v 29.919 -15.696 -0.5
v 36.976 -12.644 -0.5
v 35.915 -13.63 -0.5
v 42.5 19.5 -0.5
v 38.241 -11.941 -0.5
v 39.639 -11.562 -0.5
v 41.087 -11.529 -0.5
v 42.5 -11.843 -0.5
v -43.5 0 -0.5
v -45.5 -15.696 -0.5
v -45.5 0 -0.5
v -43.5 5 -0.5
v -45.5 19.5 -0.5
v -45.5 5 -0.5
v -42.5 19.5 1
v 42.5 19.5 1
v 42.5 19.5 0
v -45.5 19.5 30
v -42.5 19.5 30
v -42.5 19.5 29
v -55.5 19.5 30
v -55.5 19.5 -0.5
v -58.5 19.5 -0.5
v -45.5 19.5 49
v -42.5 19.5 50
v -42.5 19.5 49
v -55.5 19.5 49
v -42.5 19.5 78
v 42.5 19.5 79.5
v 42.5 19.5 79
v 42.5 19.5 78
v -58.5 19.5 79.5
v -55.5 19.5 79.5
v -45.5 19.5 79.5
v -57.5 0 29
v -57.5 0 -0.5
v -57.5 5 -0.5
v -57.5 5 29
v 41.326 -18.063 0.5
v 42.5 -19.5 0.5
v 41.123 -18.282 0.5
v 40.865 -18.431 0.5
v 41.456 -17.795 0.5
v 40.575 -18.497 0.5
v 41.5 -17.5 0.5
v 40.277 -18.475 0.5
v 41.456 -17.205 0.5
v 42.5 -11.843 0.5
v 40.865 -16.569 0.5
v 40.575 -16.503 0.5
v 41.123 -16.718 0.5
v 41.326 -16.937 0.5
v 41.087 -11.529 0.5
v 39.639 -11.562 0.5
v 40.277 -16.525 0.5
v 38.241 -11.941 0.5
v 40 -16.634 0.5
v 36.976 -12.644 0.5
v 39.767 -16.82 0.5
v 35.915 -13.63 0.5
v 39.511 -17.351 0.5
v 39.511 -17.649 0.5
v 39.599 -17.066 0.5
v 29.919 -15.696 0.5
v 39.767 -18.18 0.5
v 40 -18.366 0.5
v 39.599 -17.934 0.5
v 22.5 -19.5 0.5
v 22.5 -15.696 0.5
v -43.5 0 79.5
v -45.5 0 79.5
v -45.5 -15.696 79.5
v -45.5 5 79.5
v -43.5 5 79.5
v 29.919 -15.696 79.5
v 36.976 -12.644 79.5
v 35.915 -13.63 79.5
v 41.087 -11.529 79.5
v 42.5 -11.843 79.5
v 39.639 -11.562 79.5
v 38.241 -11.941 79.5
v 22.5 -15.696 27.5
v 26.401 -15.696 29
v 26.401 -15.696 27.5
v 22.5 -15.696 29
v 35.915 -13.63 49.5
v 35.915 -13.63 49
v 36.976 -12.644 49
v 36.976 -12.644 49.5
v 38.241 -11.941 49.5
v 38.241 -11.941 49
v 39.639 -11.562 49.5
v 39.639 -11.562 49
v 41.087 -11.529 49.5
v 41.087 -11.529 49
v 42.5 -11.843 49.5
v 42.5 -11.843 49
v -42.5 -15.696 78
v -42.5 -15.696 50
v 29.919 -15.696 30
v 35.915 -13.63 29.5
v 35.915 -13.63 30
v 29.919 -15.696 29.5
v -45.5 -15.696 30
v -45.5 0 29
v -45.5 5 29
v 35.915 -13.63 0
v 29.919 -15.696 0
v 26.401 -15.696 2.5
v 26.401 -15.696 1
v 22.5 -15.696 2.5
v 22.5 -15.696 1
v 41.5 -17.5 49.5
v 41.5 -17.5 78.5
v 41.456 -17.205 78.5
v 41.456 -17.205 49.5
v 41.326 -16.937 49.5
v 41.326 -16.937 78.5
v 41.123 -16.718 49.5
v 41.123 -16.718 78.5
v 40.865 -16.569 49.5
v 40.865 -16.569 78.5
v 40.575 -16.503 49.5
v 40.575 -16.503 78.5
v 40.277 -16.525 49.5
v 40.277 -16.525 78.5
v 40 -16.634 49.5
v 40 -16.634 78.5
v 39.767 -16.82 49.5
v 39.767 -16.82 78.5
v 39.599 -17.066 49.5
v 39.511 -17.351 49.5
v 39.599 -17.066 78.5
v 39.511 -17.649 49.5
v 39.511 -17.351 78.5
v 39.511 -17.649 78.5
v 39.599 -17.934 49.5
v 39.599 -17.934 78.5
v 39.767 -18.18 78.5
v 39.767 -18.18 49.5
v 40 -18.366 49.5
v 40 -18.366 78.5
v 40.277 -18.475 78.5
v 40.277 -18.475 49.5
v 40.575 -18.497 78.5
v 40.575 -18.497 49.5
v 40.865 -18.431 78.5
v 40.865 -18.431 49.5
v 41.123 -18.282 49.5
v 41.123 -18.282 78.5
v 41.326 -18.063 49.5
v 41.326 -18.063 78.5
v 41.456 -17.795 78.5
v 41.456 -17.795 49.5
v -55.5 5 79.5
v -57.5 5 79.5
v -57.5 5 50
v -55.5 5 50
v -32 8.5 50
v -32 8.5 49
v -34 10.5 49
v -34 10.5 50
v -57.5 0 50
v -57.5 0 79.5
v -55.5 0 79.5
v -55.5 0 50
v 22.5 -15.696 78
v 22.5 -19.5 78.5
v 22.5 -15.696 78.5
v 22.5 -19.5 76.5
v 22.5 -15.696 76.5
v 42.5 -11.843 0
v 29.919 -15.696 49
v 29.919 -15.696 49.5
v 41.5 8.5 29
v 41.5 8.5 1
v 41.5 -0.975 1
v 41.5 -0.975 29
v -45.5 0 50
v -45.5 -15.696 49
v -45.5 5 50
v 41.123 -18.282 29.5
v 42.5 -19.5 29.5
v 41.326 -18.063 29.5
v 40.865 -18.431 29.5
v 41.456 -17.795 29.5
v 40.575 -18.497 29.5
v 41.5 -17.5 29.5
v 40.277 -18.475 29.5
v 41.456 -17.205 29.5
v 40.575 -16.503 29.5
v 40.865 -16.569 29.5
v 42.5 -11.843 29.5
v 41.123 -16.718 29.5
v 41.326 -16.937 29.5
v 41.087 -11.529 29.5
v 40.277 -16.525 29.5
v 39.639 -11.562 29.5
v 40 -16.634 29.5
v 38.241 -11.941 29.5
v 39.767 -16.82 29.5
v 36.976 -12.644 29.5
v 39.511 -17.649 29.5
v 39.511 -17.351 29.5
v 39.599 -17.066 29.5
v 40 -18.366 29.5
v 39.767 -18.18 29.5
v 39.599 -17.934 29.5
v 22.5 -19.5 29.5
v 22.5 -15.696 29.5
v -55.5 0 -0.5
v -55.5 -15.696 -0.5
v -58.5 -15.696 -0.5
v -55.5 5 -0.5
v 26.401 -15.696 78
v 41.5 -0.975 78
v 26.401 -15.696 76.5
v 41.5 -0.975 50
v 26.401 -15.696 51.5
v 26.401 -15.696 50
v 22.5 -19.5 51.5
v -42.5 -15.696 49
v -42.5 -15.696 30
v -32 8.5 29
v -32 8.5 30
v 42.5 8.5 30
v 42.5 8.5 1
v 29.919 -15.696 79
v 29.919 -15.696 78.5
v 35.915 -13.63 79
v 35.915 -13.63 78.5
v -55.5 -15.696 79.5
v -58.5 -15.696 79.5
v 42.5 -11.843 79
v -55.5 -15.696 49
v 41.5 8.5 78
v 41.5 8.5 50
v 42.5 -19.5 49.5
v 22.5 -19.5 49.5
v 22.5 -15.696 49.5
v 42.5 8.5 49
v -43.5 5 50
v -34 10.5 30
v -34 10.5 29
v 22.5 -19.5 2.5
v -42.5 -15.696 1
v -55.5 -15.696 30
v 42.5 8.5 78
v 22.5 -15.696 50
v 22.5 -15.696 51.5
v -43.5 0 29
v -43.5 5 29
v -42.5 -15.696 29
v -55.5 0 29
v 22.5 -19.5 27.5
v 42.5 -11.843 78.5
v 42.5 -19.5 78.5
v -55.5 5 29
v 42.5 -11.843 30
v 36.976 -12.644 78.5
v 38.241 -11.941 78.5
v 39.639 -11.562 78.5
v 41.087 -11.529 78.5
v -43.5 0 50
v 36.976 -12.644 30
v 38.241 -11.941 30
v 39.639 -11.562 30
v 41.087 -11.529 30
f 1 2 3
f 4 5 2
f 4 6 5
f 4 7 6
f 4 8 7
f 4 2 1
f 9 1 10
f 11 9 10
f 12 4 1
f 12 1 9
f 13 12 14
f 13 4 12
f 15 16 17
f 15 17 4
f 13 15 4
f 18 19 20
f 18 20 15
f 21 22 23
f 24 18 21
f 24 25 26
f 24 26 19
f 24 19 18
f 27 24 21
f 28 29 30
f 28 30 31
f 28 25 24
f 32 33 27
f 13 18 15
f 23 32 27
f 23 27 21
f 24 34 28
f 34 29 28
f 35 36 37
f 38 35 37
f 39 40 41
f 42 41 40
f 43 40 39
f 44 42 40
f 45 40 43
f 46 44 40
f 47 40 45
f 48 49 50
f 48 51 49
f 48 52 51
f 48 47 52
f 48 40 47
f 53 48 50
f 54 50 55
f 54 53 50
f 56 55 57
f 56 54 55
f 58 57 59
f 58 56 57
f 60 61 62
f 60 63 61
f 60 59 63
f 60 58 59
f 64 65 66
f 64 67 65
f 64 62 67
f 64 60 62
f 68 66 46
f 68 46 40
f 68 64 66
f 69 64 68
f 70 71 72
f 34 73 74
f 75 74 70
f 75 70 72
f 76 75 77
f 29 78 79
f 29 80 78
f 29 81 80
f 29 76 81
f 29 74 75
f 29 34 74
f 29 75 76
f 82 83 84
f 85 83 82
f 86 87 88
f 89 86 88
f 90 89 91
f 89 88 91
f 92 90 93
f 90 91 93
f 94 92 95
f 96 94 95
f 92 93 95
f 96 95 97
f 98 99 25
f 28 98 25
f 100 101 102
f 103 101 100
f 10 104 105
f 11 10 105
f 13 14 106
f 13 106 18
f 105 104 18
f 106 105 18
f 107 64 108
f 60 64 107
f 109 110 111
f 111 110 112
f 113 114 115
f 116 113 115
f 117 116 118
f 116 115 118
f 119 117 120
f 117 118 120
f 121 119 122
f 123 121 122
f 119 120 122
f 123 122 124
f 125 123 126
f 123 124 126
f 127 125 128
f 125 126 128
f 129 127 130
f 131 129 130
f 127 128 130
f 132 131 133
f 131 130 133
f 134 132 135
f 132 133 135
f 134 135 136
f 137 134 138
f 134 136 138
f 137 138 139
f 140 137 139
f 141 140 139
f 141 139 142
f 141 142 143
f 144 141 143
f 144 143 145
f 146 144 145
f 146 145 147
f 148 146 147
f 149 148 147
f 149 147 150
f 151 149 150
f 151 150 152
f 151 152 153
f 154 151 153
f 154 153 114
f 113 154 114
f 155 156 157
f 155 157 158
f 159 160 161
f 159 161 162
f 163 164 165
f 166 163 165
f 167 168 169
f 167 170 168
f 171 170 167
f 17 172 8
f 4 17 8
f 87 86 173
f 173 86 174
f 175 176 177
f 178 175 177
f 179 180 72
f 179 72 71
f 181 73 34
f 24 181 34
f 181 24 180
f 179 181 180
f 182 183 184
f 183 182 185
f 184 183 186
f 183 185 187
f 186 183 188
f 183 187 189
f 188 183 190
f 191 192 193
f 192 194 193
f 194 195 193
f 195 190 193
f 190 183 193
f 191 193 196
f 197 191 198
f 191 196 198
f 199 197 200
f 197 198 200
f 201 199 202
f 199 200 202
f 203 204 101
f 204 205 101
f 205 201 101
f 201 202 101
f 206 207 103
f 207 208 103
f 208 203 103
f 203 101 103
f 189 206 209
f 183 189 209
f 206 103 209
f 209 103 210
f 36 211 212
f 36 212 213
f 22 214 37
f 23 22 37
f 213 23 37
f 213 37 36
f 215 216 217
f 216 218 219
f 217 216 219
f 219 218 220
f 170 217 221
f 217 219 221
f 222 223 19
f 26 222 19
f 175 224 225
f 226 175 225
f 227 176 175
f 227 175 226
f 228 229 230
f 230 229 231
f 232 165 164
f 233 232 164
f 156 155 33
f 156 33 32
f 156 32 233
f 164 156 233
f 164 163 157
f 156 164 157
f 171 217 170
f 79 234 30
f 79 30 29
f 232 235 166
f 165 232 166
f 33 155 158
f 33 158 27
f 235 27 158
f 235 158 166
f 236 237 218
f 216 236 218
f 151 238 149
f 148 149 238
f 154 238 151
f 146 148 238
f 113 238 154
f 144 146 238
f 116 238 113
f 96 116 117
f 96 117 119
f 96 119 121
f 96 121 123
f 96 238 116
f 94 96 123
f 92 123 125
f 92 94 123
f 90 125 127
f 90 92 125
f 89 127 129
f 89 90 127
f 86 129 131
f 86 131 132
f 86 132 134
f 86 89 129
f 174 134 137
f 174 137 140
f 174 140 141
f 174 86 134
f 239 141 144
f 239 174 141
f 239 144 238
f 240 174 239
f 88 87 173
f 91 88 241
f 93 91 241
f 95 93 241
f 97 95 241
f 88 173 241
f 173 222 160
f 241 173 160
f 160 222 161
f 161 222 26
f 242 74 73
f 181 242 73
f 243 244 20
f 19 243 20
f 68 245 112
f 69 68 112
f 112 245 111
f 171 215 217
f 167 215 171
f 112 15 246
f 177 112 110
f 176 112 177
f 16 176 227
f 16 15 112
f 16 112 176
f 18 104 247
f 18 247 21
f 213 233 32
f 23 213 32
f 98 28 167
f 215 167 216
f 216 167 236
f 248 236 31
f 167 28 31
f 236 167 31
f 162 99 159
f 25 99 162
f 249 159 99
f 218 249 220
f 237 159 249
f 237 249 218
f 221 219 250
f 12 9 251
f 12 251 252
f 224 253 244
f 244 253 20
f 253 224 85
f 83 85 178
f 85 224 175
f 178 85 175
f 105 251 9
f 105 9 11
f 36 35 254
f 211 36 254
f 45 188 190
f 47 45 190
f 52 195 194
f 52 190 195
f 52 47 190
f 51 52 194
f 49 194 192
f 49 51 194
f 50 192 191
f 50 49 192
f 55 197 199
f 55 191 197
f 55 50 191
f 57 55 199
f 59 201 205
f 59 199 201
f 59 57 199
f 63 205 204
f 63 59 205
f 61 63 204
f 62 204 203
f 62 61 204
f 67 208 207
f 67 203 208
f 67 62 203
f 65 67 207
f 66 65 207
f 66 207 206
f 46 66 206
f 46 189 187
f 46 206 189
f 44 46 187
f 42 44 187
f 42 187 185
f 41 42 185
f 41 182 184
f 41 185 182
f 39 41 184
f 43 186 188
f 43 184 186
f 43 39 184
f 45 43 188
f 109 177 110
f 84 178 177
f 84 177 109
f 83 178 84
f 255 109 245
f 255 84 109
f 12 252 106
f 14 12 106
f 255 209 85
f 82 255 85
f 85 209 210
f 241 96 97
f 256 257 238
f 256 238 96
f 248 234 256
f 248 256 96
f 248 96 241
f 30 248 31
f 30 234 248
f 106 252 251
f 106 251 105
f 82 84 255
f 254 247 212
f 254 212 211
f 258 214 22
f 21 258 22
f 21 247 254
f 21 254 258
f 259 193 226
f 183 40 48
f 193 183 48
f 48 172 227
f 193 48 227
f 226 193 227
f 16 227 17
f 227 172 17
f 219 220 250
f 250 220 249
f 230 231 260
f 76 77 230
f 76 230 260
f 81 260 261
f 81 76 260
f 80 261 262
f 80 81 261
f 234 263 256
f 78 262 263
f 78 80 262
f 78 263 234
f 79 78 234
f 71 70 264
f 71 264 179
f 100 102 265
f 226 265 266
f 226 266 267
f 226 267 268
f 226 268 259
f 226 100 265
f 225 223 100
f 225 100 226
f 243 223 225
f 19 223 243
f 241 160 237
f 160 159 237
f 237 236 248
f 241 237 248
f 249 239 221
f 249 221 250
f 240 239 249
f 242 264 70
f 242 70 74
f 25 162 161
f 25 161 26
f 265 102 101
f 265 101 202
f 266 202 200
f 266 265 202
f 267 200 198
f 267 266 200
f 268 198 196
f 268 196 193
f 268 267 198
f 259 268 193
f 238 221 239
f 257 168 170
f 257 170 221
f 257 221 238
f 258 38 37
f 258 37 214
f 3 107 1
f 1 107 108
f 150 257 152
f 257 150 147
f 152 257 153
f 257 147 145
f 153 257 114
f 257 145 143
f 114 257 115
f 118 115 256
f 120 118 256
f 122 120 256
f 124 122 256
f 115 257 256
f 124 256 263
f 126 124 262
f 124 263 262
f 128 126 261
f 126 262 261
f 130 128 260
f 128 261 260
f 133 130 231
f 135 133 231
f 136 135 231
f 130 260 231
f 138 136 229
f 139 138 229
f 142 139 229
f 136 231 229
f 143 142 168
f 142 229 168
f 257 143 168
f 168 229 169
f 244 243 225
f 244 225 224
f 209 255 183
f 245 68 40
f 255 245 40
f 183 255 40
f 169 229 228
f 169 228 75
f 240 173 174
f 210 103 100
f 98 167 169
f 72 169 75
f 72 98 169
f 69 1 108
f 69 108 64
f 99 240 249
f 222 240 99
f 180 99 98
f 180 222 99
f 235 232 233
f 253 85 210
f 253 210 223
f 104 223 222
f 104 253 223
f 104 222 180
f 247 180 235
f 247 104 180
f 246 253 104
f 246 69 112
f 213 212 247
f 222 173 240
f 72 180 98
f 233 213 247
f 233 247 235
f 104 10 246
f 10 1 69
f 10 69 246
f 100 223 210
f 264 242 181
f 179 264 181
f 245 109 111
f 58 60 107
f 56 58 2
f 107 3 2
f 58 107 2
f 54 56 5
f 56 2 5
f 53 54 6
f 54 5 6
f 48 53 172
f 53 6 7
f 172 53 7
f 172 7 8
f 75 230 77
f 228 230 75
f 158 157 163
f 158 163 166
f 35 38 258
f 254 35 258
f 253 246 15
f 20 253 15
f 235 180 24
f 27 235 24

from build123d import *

# Parameters (mm, degrees)
SKETCH4_W                 = 85
SKETCH4_H                 = 39
BOSS_EXTRUDE2_DEPTH       = 30
BOSS_EXTRUDE3_DEPTH       = 39
SKETCH7_W                 = 84
SKETCH7_H                 = 28
CUT_EXTRUDE1_DEPTH        = 39
CUT_EXTRUDE2_DEPTH        = 1
SKETCH9_W                 = 1
SKETCH9_H                 = 9
CUT_EXTRUDE4_DEPTH        = 28
SKETCH19_W                = 31
SKETCH19_H                = 39
BOSS_EXTRUDE4_DEPTH       = 2
SKETCH20_W                = 3
SKETCH20_H                = 39
BOSS_EXTRUDE5_DEPTH       = 9
SKETCH38_W                = 1
SKETCH38_H                = 29
BOSS_EXTRUDE6_DEPTH       = 9
SKETCH39_W                = 1
SKETCH39_H                = 39
BOSS_EXTRUDE7_DEPTH       = 47.410129
BOSS_EXTRUDE8_DEPTH       = 28
SKETCH42_W                = 2
SKETCH42_H                = 5
CUT_EXTRUDE5_DEPTH        = 30
BOSS_EXTRUDE9_DEPTH       = 1
SKETCH44_R                = 1
CUT_EXTRUDE7_DEPTH        = 32
SKETCH46_W                = 85
SKETCH46_H                = 3.803593904
CUT_EXTRUDE8_DEPTH        = 1
CUT_EXTRUDE9_START        = -1
SKETCH48_W                = 65
SKETCH48_H                = 1.901796952
CUT_EXTRUDE9_DEPTH        = 30
SKETCH49_R                = 6
CUT_EXTRUDE10_DEPTH       = 1
CUT_EXTRUDE11_START       = -3
SKETCH50_W                = 31
SKETCH50_H                = 1.901796952
CUT_EXTRUDE11_DEPTH       = 3
SKETCH52_W                = 3
SKETCH52_H                = 39
BOSS_EXTRUDE10_DEPTH      = 0.5
CUT_EXTRUDE13_START       = -85
SKETCH56_W                = 1
SKETCH56_H                = 35.196406096
CUT_EXTRUDE13_DEPTH       = 85
SKETCH58_W                = 88
SKETCH58_H                = 39
CUT_EXTRUDE14_DEPTH       = 0.5
SKETCH59_W                = 88
SKETCH59_H                = 39
CUT_EXTRUDE15_DEPTH       = 0.5
SKETCH60_W                = 19
SKETCH60_H                = 37.098203048
BOSS_EXTRUDE11_DEPTH      = 10
BOSS_EXTRUDE12_DEPTH      = 30.5
BOSS_EXTRUDE12_DEPTH_BACK = 49.5
SKETCH61_W                = 3
SKETCH61_H                = 37.098203048
MIRROR13_COPY_1_SKETCH_W  = 2
MIRROR13_COPY_1_SKETCH_H  = 5
MIRROR13_COPY_1_DEPTH     = 30
MIRROR13_COPY_2_SKETCH_W  = 2
MIRROR13_COPY_2_SKETCH_H  = 5
MIRROR13_COPY_2_DEPTH     = 30
SKETCH63_W                = 85
SKETCH63_H                = 3.803593904
CUT_EXTRUDE16_DEPTH       = 0.5
MIRROR15_COPY_1_SKETCH_W  = 85
MIRROR15_COPY_1_SKETCH_H  = 3.803593904
MIRROR15_COPY_1_DEPTH     = 0.5
SKETCH66_R                = 6
CUT_EXTRUDE17_DEPTH       = 0.5
MIRROR17_COPY_1_SKETCH_R  = 6
MIRROR17_COPY_1_DEPTH     = 0.5
CHAMFER3_START            = 24.587959213
CHAMFER3_OUTLINE_W        = 9
CHAMFER3_OUTLINE_H        = 0.5
CHAMFER3_DEPTH            = 7.695233043
SKETCH67_W                = 3
SKETCH67_H                = 19
CUT_EXTRUDE18_DEPTH       = 1.901797
SKETCH72_W                = 65
SKETCH72_H                = 0.5
CUT_EXTRUDE21_DEPTH       = 1.901797
MIRROR20_COPY_1_SKETCH_W  = 65
MIRROR20_COPY_1_SKETCH_H  = 0.5
MIRROR20_COPY_1_DEPTH     = 1.901797
SKETCH74_W                = 7.418761949
SKETCH74_H                = 3.803593904
BOSS_EXTRUDE13_DEPTH      = 2
MIRROR22_COPY_1_SKETCH_W  = 7.418761949
MIRROR22_COPY_1_SKETCH_H  = 3.803593904
MIRROR22_COPY_1_DEPTH     = 2
CUT_EXTRUDE31_START       = -16
SKETCH79_W                = 80
SKETCH79_H                = 1.901796952
CUT_EXTRUDE31_DEPTH       = 16
SKETCH81_W                = 94
SKETCH81_H                = 1
CUT_EXTRUDE33_DEPTH       = 2
CUT_EXTRUDE34_START       = -11
SKETCH80_W                = 1
SKETCH80_H                = 29
CUT_EXTRUDE34_DEPTH       = 11
CHAMFER5_SIZE             = 2
CHAMFER5_OF_MIRROR23_SIZE = 2


with BuildPart() as part:
    # Sketch4 → Boss-Extrude2 (new body)
    with BuildSketch(Plane.XY):
        Rectangle(SKETCH4_W, SKETCH4_H)
    extrude(amount=BOSS_EXTRUDE2_DEPTH)

    # Sketch6 → Boss-Extrude3 (add)
    with BuildSketch(Plane(origin=(0, 19.5, 0), x_dir=(1, 0, 0), z_dir=(0, 1, 0))):
        Polygon((-4.910129242, 0), (-4.910129242, 1), (-43.5, 1), (-43.5, -30), (-42.5, -30), (-42.5, 0), align=None)
    extrude(amount=-BOSS_EXTRUDE3_DEPTH)

    # Sketch7 → Cut-Extrude1 (cut)
    with BuildSketch(Plane(origin=(0, 19.5, 0), x_dir=(1, 0, 0), z_dir=(0, 1, 0))):
        with Locations((-0.5, -15)):
            Rectangle(SKETCH7_W, SKETCH7_H)
    extrude(amount=-CUT_EXTRUDE1_DEPTH, mode=Mode.SUBTRACT)

    # Angled cut → Cut-Extrude2 (cut)
    with BuildSketch(Plane.XY.offset(30)):
        Polygon((12.07, 10.5), (42.5, 10.5), (42.5, 19.5), (-42.5, 19.5), (-34, 10.5), align=None)
    extrude(amount=-CUT_EXTRUDE2_DEPTH, mode=Mode.SUBTRACT)

    # Sketch9 → Cut-Extrude4 (cut)
    with BuildSketch(Plane.XY.offset(29)):
        with Locations((42, 15)):
            Rectangle(SKETCH9_W, SKETCH9_H)
    extrude(amount=-CUT_EXTRUDE4_DEPTH, mode=Mode.SUBTRACT)

    # Sketch19 → Boss-Extrude4 (add)
    with BuildSketch(Plane.ZY.offset(43.5)):
        with Locations((14.5, 0)):
            Rectangle(SKETCH19_W, SKETCH19_H)
    extrude(amount=BOSS_EXTRUDE4_DEPTH)

    # Sketch20 → Boss-Extrude5 (add)
    with BuildSketch(Plane.XY.offset(30)):
        with Locations((-44, 0)):
            Rectangle(SKETCH20_W, SKETCH20_H)
    extrude(amount=BOSS_EXTRUDE5_DEPTH)

    # Sketch38 → Boss-Extrude6 (add)
    with BuildSketch(Plane(origin=(0, 10.5, 0), x_dir=(1, 0, 0), z_dir=(0, 1, 0))):
        with Locations((42, -15.5)):
            Rectangle(SKETCH38_W, SKETCH38_H)
    extrude(amount=BOSS_EXTRUDE6_DEPTH)

    # Sketch39 → Boss-Extrude7 (add)
    with BuildSketch(Plane(origin=(-4.910129242, 0, 0), x_dir=(0, 0, -1), z_dir=(1, 0, 0))):
        with Locations((0.5, 0)):
            Rectangle(SKETCH39_W, SKETCH39_H)
    extrude(amount=BOSS_EXTRUDE7_DEPTH)

    # Sketch40 → Boss-Extrude8 (add)
    with BuildSketch(Plane(origin=(0, 0, 29), x_dir=(-1, 0, 0), z_dir=(0, 0, -1))):
        Polygon((-42.5, -19.5), (-42.5, 0), (-22.5, -19.5), align=None)
    extrude(amount=BOSS_EXTRUDE8_DEPTH)

    # Sketch42 → Cut-Extrude5 (cut)
    with BuildSketch(Plane(origin=(0, 0, -1), x_dir=(-1, 0, 0), z_dir=(0, 0, -1))):
        with Locations((44.5, 2.5)):
            Rectangle(SKETCH42_W, SKETCH42_H)
    cut_extrude5 = extrude(amount=-CUT_EXTRUDE5_DEPTH, mode=Mode.SUBTRACT)

    # Sketch45 → Boss-Extrude9 (add)
    with BuildSketch(Plane.XY.offset(30)):
        Polygon((-42.5, 19.5), (-42.5, -19.5), (42.5, -19.5), (42.5, 19.5), (41.5, 19.5), (41.5, 10.5), (-34, 10.5), align=None)
    extrude(amount=BOSS_EXTRUDE9_DEPTH)

    # Sketch44 → Cut-Extrude7 (cut)
    with BuildSketch(Plane.XY.offset(-1)):
        with Locations((40.5, -17.5)):
            Circle(SKETCH44_R)
    extrude(amount=CUT_EXTRUDE7_DEPTH, mode=Mode.SUBTRACT)

    # Sketch46 → Cut-Extrude8 (cut)
    with BuildSketch(Plane.XY.offset(31)):
        with Locations((0, -17.598203048)):
            Rectangle(SKETCH46_W, SKETCH46_H)
    cut_extrude8 = extrude(amount=-CUT_EXTRUDE8_DEPTH, mode=Mode.SUBTRACT)

    # Mirror1: Cut-Extrude8 across plane
    add(cut_extrude8.mirror(Plane.XY.offset(15)), mode=Mode.SUBTRACT)

    # Sketch48 → Cut-Extrude9 (cut)
    with BuildSketch(Plane(origin=(0, 0, 29), x_dir=(-1, 0, 0), z_dir=(0, 0, -1)).offset(CUT_EXTRUDE9_START)):
        with Locations((10, -18.549101524)):
            Rectangle(SKETCH48_W, SKETCH48_H)
    extrude(amount=CUT_EXTRUDE9_DEPTH, mode=Mode.SUBTRACT)

    # Sketch49 → Cut-Extrude10 (cut)
    with BuildSketch(Plane(origin=(0, 0, -1), x_dir=(-1, 0, 0), z_dir=(0, 0, -1))):
        with Locations((-40.5, -17.5)):
            Circle(SKETCH49_R)
    cut_extrude10 = extrude(amount=-CUT_EXTRUDE10_DEPTH, mode=Mode.SUBTRACT)

    # Chamfer1
    # the kernel refuses this chamfer: 5.980598359, 5 mm, written as the material it takes off along each edge
    with BuildSketch(Plane(origin=(34.777496262, -15.696406096, 0), x_dir=(0.4822071205961933, 0.8760572429050103, 0), z_dir=(0, 0, -1))) as chamfer1_piece_1:
        with BuildLine():
            Line((2.536104825, 0.160553083), (-2.520260012, -4.417082469))
            Line((-2.520260012, -4.417082469), (-2.625046943, -4.359404727))
            ThreePointArc((-2.625046943, -4.359404727), (-1.330775488, -2.169655928), (-0.10478693, 0.057677742))
            Line((-0.10478693, 0.057677742), (0.023511338, 0.117278471))
            ThreePointArc((0.023511338, 0.117278471), (1.269229547, 0.003245098), (2.512593487, 0.277831553))
            Line((2.512593487, 0.277831553), (2.536104825, 0.160553083))
        make_face()
    extrude(amount=13.71375438, mode=Mode.SUBTRACT)

    # Mirror5: Cut-Extrude10 across plane
    add(cut_extrude10.mirror(Plane.XY.offset(15)), mode=Mode.SUBTRACT)

    # Chamfer2
    # the kernel refuses this chamfer: 5, 3.700015876 mm, written as the material it takes off along each edge
    with BuildSketch(Plane(origin=(34.777496262, -15.696406096, 30), x_dir=(-1, 0, 0), z_dir=(0, 0, 1))) as chamfer2_piece_1:
        with BuildLine():
            Line((4.531412713, 0.062382614), (-1.046280636, -1.768725655))
            Line((-1.046280636, -1.768725655), (-1.127384723, -1.710226706))
            ThreePointArc((-1.127384723, -1.710226706), (-0.481456561, -0.905912415), (-0.095375062, 0.030059898))
            Line((-0.095375062, 0.030059898), (0, 0.1))
            ThreePointArc((0, 0.1), (2.265706356, 0.1), (4.531412713, 0.162382614))
            Line((4.531412713, 0.162382614), (4.531412713, 0.062382614))
        make_face()
    extrude(amount=12.329605235, mode=Mode.SUBTRACT)

    # Sketch50 → Cut-Extrude11 (cut)
    with BuildSketch(Plane(origin=(-42.5, 0, 0), x_dir=(0, 0, -1), z_dir=(1, 0, 0)).offset(CUT_EXTRUDE11_START)):
        with Locations((-14.5, -18.549101524)):
            Rectangle(SKETCH50_W, SKETCH50_H)
    extrude(amount=CUT_EXTRUDE11_DEPTH, mode=Mode.SUBTRACT)

    # Sketch52 → Boss-Extrude10 (add)
    with BuildSketch(Plane.XY.offset(39)):
        with Locations((-44, 0)):
            Rectangle(SKETCH52_W, SKETCH52_H)
    extrude(amount=BOSS_EXTRUDE10_DEPTH)

    # Mirror8: part across plane


with BuildPart() as part_1:
    add(part.part)
    add(part.part.mirror(Plane.XY.offset(39.5)))

    # Sketch56 → Cut-Extrude13 (cut)
    with BuildSketch(Plane(origin=(42.5, 0, 0), x_dir=(0, 0, -1), z_dir=(1, 0, 0)).offset(CUT_EXTRUDE13_START)):
        with Locations((-30.5, 1.901796952)):
            Rectangle(SKETCH56_W, SKETCH56_H)
    cut_extrude13 = extrude(amount=CUT_EXTRUDE13_DEPTH, mode=Mode.SUBTRACT)

    # Mirror11: Cut-Extrude13 across plane
    add(cut_extrude13.mirror(Plane.XY.offset(39.5)), mode=Mode.SUBTRACT)

    # Sketch58 → Cut-Extrude14 (cut)
    with BuildSketch(Plane(origin=(0, 0, -1), x_dir=(-1, 0, 0), z_dir=(0, 0, -1))):
        with Locations((1.5, 0)):
            Rectangle(SKETCH58_W, SKETCH58_H)
    extrude(amount=-CUT_EXTRUDE14_DEPTH, mode=Mode.SUBTRACT)

    # Sketch59 → Cut-Extrude15 (cut)
    with BuildSketch(Plane.XY.offset(80)):
        with Locations((-1.5, 0)):
            Rectangle(SKETCH59_W, SKETCH59_H)
    extrude(amount=-CUT_EXTRUDE15_DEPTH, mode=Mode.SUBTRACT)

    # Sketch60 → Boss-Extrude11 (add)
    with BuildSketch(Plane.ZY.offset(45.5)):
        with Locations((39.5, 0.950898476)):
            Rectangle(SKETCH60_W, SKETCH60_H)
    extrude(amount=BOSS_EXTRUDE11_DEPTH)

    # Sketch61 → Boss-Extrude12 (add, two sides: drawn at the far end of the back side and taken through both)
    with BuildSketch(Plane(origin=(0, 0, 30), x_dir=(-1, 0, 0), z_dir=(0, 0, -1)).offset(-BOSS_EXTRUDE12_DEPTH_BACK)):
        with Locations((57, 0.950898476)):
            Rectangle(SKETCH61_W, SKETCH61_H)
    extrude(amount=BOSS_EXTRUDE12_DEPTH + BOSS_EXTRUDE12_DEPTH_BACK)

    # Mirror12: Cut-Extrude5 across plane
    add(cut_extrude5.mirror(Plane.ZY.offset(50.5)), mode=Mode.SUBTRACT)

    # Mirror13 copy 1 sketch → Mirror13 copy 1 (cut)
    with BuildSketch(Plane(origin=(-101, 0, 80), x_dir=(1, 0, 0), z_dir=(0, 0, 1))):
        with Locations((44.5, 2.5)):
            Rectangle(MIRROR13_COPY_1_SKETCH_W, MIRROR13_COPY_1_SKETCH_H)
    extrude(amount=-MIRROR13_COPY_1_DEPTH, mode=Mode.SUBTRACT)

    # Mirror13 copy 2 sketch → Mirror13 copy 2 (cut)
    with BuildSketch(Plane(origin=(0, 0, 80), x_dir=(-1, 0, 0), z_dir=(0, 0, 1))):
        with Locations((44.5, -2.5)):
            Rectangle(MIRROR13_COPY_2_SKETCH_W, MIRROR13_COPY_2_SKETCH_H)
    extrude(amount=-MIRROR13_COPY_2_DEPTH, mode=Mode.SUBTRACT)

    # Sketch63 → Cut-Extrude16 (cut)
    with BuildSketch(Plane(origin=(0, 0, 0), x_dir=(-1, 0, 0), z_dir=(0, 0, -1))):
        with Locations((0, -17.598203048)):
            Rectangle(SKETCH63_W, SKETCH63_H)
    cut_extrude16 = extrude(amount=-CUT_EXTRUDE16_DEPTH, mode=Mode.SUBTRACT)

    # Mirror14: Cut-Extrude16 across plane
    add(cut_extrude16.mirror(Plane.XY.offset(15)), mode=Mode.SUBTRACT)

    # Mirror15: Cut-Extrude16 across plane
    add(cut_extrude16.mirror(Plane.XY.offset(39.5)), mode=Mode.SUBTRACT)

    # Mirror15 copy 1 sketch → Mirror15 copy 1 (cut)
    with BuildSketch(Plane(origin=(0, 0, 49), x_dir=(-1, 0, 0), z_dir=(0, 0, -1))):
        with Locations((0, -17.598203048)):
            Rectangle(MIRROR15_COPY_1_SKETCH_W, MIRROR15_COPY_1_SKETCH_H)
    extrude(amount=-MIRROR15_COPY_1_DEPTH, mode=Mode.SUBTRACT)

    # Sketch66 → Cut-Extrude17 (cut)
    with BuildSketch(Plane(origin=(0, 0, 0), x_dir=(-1, 0, 0), z_dir=(0, 0, -1))):
        with Locations((-40.5, -17.5)):
            Circle(SKETCH66_R)
    cut_extrude17 = extrude(amount=-CUT_EXTRUDE17_DEPTH, mode=Mode.SUBTRACT)

    # Mirror16: Cut-Extrude17 across plane
    add(cut_extrude17.mirror(Plane.XY.offset(15)), mode=Mode.SUBTRACT)

    # Mirror17: Cut-Extrude17 across plane
    add(cut_extrude17.mirror(Plane.XY.offset(39.5)), mode=Mode.SUBTRACT)

    # Mirror17 copy 1 sketch → Mirror17 copy 1 (cut)
    with BuildSketch(Plane(origin=(0, 0, 49), x_dir=(-1, 0, 0), z_dir=(0, 0, -1))):
        with Locations((-40.5, -17.5)):
            Circle(MIRROR17_COPY_1_SKETCH_R)
    extrude(amount=-MIRROR17_COPY_1_DEPTH, mode=Mode.SUBTRACT)

    # Chamfer3: read off the stored shape, not the designer's step
    # Chamfer3 outline → Chamfer3 (cut)
    with BuildSketch(Plane(origin=(0, 0, 0), x_dir=(0.9454325743674387, 0.32581781308724894, 0), z_dir=(0.32581781308724894, -0.9454325743674388, 0)).offset(CHAMFER3_START)):
        with Locations((26.5, 0.25)):
            Rectangle(CHAMFER3_OUTLINE_W, CHAMFER3_OUTLINE_H)
    extrude(amount=CHAMFER3_DEPTH, mode=Mode.SUBTRACT)

    # Chamfer4
    # the kernel refuses this chamfer: 5.980598359, 5, 4.195498156 mm, written as the material it takes off along each edge
    with BuildSketch(Plane(origin=(34.777496262, -15.696406096, 29.5), x_dir=(0.48220712059619303, 0.8760572429050105, 0), z_dir=(0, 0, 1))) as chamfer4_piece_1:
        with BuildLine():
            Line((2.536104825, -0.160553083), (-2.520260012, 4.417082469))
            Line((-2.520260012, 4.417082469), (-2.625046943, 4.359404727))
            ThreePointArc((-2.625046943, 4.359404727), (-1.330775488, 2.169655928), (-0.10478693, -0.057677742))
            Line((-0.10478693, -0.057677742), (0.023511338, -0.117278471))
            ThreePointArc((0.023511338, -0.117278471), (1.269229547, -0.003245098), (2.512593487, -0.277831553))
            Line((2.512593487, -0.277831553), (2.536104825, -0.160553083))
        make_face()
    extrude(amount=13.21375438, mode=Mode.SUBTRACT)
    with BuildSketch(Plane(origin=(34.777496262, -15.696406096, 78.5), x_dir=(-1, 0, 0), z_dir=(0, 0, 1))) as chamfer4_piece_2:
        with BuildLine():
            Line((5.084904413, 0.077943419), (-1.363581496, -2.144353161))
            Line((-1.363581496, -2.144353161), (-1.454986815, -2.067203369))
            ThreePointArc((-1.454986815, -2.067203369), (-0.614874417, -1.110352928), (-0.114079988, 0.035955236))
            Line((-0.114079988, 0.035955236), (0, 0.119611967))
            ThreePointArc((0, 0.119611967), (2.542452207, 0.119611967), (5.084904413, 0.197555386))
            Line((5.084904413, 0.197555386), (5.084904413, 0.077943419))
        make_face()
    extrude(amount=13.21375438, mode=Mode.SUBTRACT)
    with BuildSketch(Plane(origin=(34.777496262, -15.696406096, 49.5), x_dir=(0.48220712059619303, 0.8760572429050105, 0), z_dir=(0, 0, -1))) as chamfer4_piece_3:
        with BuildLine():
            Line((2.536104825, 0.160553083), (-2.520260012, -4.417082469))
            Line((-2.520260012, -4.417082469), (-2.625046943, -4.359404727))
            ThreePointArc((-2.625046943, -4.359404727), (-1.330775488, -2.169655928), (-0.10478693, 0.057677742))
            Line((-0.10478693, 0.057677742), (0.023511338, 0.117278471))
            ThreePointArc((0.023511338, 0.117278471), (1.269229547, 0.003245098), (2.512593487, 0.277831553))
            Line((2.512593487, 0.277831553), (2.536104825, 0.160553083))
        make_face()
    extrude(amount=13.21375438, mode=Mode.SUBTRACT)

    # Sketch67 → Cut-Extrude18 (cut)
    with BuildSketch(Plane.XZ.offset(19.5)):
        with Locations((-44, 39.5)):
            Rectangle(SKETCH67_W, SKETCH67_H)
    extrude(amount=-CUT_EXTRUDE18_DEPTH, mode=Mode.SUBTRACT)

    # Sketch72 → Cut-Extrude21 (cut)
    with BuildSketch(Plane.XZ.offset(17.598203048)):
        with Locations((-10, 0.75)):
            Rectangle(SKETCH72_W, SKETCH72_H)
    cut_extrude21 = extrude(amount=-CUT_EXTRUDE21_DEPTH, mode=Mode.SUBTRACT)

    # Mirror19: Cut-Extrude21 across plane
    add(cut_extrude21.mirror(Plane.XY.offset(15)), mode=Mode.SUBTRACT)

    # Mirror20: Cut-Extrude21 across plane
    add(cut_extrude21.mirror(Plane.XY.offset(39.5)), mode=Mode.SUBTRACT)

    # Mirror20 copy 1 sketch → Mirror20 copy 1 (cut)
    with BuildSketch(Plane(origin=(0, -17.598203048, 49), x_dir=(1, 0, 0), z_dir=(0, -1, 0))):
        with Locations((-10, 0.75)):
            Rectangle(MIRROR20_COPY_1_SKETCH_W, MIRROR20_COPY_1_SKETCH_H)
    extrude(amount=-MIRROR20_COPY_1_DEPTH, mode=Mode.SUBTRACT)

    # Sketch74 → Boss-Extrude13 (add)
    with BuildSketch(Plane(origin=(0, 0, 0.5), x_dir=(-1, 0, 0), z_dir=(0, 0, -1))):
        with Locations((-26.209380975, -17.598203048)):
            Rectangle(SKETCH74_W, SKETCH74_H)
    boss_extrude13 = extrude(amount=-BOSS_EXTRUDE13_DEPTH)

    # Mirror21: Boss-Extrude13 across plane
    add(boss_extrude13.mirror(Plane.XY.offset(15)))

    # Mirror22: Boss-Extrude13 across plane
    add(boss_extrude13.mirror(Plane.XY.offset(39.5)))

    # Mirror22 copy 1 sketch → Mirror22 copy 1 (add)
    with BuildSketch(Plane(origin=(0, 0, 49.5), x_dir=(-1, 0, 0), z_dir=(0, 0, -1))):
        with Locations((-26.209380975, -17.598203048)):
            Rectangle(MIRROR22_COPY_1_SKETCH_W, MIRROR22_COPY_1_SKETCH_H)
    extrude(amount=-MIRROR22_COPY_1_DEPTH)

    # Sketch79 → Cut-Extrude31 (cut)
    with BuildSketch(Plane(origin=(-42.5, 0, 0), x_dir=(0, 0, -1), z_dir=(1, 0, 0)).offset(CUT_EXTRUDE31_START)):
        with Locations((-39.5, -16.647304572)):
            Rectangle(SKETCH79_W, SKETCH79_H)
    cut_extrude31 = extrude(amount=CUT_EXTRUDE31_DEPTH, mode=Mode.SUBTRACT)

    # Sketch81 → Cut-Extrude33 (cut)
    with BuildSketch(Plane(origin=(0, 10.5, 0), x_dir=(1, 0, 0), z_dir=(0, 1, 0))):
        with Locations((13, -29.5)):
            Rectangle(SKETCH81_W, SKETCH81_H)
    cut_extrude33 = extrude(amount=-CUT_EXTRUDE33_DEPTH, mode=Mode.SUBTRACT)

    # Sketch80 → Cut-Extrude34 (cut)
    with BuildSketch(Plane(origin=(0, 19.5, 0), x_dir=(1, 0, 0), z_dir=(0, 1, 0)).offset(CUT_EXTRUDE34_START)):
        with Locations((42, -15.5)):
            Rectangle(SKETCH80_W, SKETCH80_H)
    cut_extrude34 = extrude(amount=CUT_EXTRUDE34_DEPTH, mode=Mode.SUBTRACT)

    # Chamfer5
    chamfer5_edges = [part_1.edges().sort_by_distance(p)[0] for p in [
        (-34, 8.5, 29.5),
    ]]
    chamfer(chamfer5_edges, length=CHAMFER5_SIZE - 0.0001)  # a hair under: the kernel refuses the full size

    # Mirror23: Cut-Extrude31, Cut-Extrude33, Cut-Extrude34 across plane
    add(cut_extrude31.mirror(Plane.XY.offset(39.5)), mode=Mode.SUBTRACT)
    add(cut_extrude33.mirror(Plane.XY.offset(39.5)), mode=Mode.SUBTRACT)
    add(cut_extrude34.mirror(Plane.XY.offset(39.5)), mode=Mode.SUBTRACT)

    # Chamfer5 of Mirror23
    chamfer5_of_mirror23_edges = [part_1.edges().sort_by_distance(p)[0] for p in [
        (-34, 8.5, 49.5),
    ]]
    chamfer(chamfer5_of_mirror23_edges, length=CHAMFER5_OF_MIRROR23_SIZE - 0.0001)  # a hair under: the kernel refuses the full size


solid = part_1.part
